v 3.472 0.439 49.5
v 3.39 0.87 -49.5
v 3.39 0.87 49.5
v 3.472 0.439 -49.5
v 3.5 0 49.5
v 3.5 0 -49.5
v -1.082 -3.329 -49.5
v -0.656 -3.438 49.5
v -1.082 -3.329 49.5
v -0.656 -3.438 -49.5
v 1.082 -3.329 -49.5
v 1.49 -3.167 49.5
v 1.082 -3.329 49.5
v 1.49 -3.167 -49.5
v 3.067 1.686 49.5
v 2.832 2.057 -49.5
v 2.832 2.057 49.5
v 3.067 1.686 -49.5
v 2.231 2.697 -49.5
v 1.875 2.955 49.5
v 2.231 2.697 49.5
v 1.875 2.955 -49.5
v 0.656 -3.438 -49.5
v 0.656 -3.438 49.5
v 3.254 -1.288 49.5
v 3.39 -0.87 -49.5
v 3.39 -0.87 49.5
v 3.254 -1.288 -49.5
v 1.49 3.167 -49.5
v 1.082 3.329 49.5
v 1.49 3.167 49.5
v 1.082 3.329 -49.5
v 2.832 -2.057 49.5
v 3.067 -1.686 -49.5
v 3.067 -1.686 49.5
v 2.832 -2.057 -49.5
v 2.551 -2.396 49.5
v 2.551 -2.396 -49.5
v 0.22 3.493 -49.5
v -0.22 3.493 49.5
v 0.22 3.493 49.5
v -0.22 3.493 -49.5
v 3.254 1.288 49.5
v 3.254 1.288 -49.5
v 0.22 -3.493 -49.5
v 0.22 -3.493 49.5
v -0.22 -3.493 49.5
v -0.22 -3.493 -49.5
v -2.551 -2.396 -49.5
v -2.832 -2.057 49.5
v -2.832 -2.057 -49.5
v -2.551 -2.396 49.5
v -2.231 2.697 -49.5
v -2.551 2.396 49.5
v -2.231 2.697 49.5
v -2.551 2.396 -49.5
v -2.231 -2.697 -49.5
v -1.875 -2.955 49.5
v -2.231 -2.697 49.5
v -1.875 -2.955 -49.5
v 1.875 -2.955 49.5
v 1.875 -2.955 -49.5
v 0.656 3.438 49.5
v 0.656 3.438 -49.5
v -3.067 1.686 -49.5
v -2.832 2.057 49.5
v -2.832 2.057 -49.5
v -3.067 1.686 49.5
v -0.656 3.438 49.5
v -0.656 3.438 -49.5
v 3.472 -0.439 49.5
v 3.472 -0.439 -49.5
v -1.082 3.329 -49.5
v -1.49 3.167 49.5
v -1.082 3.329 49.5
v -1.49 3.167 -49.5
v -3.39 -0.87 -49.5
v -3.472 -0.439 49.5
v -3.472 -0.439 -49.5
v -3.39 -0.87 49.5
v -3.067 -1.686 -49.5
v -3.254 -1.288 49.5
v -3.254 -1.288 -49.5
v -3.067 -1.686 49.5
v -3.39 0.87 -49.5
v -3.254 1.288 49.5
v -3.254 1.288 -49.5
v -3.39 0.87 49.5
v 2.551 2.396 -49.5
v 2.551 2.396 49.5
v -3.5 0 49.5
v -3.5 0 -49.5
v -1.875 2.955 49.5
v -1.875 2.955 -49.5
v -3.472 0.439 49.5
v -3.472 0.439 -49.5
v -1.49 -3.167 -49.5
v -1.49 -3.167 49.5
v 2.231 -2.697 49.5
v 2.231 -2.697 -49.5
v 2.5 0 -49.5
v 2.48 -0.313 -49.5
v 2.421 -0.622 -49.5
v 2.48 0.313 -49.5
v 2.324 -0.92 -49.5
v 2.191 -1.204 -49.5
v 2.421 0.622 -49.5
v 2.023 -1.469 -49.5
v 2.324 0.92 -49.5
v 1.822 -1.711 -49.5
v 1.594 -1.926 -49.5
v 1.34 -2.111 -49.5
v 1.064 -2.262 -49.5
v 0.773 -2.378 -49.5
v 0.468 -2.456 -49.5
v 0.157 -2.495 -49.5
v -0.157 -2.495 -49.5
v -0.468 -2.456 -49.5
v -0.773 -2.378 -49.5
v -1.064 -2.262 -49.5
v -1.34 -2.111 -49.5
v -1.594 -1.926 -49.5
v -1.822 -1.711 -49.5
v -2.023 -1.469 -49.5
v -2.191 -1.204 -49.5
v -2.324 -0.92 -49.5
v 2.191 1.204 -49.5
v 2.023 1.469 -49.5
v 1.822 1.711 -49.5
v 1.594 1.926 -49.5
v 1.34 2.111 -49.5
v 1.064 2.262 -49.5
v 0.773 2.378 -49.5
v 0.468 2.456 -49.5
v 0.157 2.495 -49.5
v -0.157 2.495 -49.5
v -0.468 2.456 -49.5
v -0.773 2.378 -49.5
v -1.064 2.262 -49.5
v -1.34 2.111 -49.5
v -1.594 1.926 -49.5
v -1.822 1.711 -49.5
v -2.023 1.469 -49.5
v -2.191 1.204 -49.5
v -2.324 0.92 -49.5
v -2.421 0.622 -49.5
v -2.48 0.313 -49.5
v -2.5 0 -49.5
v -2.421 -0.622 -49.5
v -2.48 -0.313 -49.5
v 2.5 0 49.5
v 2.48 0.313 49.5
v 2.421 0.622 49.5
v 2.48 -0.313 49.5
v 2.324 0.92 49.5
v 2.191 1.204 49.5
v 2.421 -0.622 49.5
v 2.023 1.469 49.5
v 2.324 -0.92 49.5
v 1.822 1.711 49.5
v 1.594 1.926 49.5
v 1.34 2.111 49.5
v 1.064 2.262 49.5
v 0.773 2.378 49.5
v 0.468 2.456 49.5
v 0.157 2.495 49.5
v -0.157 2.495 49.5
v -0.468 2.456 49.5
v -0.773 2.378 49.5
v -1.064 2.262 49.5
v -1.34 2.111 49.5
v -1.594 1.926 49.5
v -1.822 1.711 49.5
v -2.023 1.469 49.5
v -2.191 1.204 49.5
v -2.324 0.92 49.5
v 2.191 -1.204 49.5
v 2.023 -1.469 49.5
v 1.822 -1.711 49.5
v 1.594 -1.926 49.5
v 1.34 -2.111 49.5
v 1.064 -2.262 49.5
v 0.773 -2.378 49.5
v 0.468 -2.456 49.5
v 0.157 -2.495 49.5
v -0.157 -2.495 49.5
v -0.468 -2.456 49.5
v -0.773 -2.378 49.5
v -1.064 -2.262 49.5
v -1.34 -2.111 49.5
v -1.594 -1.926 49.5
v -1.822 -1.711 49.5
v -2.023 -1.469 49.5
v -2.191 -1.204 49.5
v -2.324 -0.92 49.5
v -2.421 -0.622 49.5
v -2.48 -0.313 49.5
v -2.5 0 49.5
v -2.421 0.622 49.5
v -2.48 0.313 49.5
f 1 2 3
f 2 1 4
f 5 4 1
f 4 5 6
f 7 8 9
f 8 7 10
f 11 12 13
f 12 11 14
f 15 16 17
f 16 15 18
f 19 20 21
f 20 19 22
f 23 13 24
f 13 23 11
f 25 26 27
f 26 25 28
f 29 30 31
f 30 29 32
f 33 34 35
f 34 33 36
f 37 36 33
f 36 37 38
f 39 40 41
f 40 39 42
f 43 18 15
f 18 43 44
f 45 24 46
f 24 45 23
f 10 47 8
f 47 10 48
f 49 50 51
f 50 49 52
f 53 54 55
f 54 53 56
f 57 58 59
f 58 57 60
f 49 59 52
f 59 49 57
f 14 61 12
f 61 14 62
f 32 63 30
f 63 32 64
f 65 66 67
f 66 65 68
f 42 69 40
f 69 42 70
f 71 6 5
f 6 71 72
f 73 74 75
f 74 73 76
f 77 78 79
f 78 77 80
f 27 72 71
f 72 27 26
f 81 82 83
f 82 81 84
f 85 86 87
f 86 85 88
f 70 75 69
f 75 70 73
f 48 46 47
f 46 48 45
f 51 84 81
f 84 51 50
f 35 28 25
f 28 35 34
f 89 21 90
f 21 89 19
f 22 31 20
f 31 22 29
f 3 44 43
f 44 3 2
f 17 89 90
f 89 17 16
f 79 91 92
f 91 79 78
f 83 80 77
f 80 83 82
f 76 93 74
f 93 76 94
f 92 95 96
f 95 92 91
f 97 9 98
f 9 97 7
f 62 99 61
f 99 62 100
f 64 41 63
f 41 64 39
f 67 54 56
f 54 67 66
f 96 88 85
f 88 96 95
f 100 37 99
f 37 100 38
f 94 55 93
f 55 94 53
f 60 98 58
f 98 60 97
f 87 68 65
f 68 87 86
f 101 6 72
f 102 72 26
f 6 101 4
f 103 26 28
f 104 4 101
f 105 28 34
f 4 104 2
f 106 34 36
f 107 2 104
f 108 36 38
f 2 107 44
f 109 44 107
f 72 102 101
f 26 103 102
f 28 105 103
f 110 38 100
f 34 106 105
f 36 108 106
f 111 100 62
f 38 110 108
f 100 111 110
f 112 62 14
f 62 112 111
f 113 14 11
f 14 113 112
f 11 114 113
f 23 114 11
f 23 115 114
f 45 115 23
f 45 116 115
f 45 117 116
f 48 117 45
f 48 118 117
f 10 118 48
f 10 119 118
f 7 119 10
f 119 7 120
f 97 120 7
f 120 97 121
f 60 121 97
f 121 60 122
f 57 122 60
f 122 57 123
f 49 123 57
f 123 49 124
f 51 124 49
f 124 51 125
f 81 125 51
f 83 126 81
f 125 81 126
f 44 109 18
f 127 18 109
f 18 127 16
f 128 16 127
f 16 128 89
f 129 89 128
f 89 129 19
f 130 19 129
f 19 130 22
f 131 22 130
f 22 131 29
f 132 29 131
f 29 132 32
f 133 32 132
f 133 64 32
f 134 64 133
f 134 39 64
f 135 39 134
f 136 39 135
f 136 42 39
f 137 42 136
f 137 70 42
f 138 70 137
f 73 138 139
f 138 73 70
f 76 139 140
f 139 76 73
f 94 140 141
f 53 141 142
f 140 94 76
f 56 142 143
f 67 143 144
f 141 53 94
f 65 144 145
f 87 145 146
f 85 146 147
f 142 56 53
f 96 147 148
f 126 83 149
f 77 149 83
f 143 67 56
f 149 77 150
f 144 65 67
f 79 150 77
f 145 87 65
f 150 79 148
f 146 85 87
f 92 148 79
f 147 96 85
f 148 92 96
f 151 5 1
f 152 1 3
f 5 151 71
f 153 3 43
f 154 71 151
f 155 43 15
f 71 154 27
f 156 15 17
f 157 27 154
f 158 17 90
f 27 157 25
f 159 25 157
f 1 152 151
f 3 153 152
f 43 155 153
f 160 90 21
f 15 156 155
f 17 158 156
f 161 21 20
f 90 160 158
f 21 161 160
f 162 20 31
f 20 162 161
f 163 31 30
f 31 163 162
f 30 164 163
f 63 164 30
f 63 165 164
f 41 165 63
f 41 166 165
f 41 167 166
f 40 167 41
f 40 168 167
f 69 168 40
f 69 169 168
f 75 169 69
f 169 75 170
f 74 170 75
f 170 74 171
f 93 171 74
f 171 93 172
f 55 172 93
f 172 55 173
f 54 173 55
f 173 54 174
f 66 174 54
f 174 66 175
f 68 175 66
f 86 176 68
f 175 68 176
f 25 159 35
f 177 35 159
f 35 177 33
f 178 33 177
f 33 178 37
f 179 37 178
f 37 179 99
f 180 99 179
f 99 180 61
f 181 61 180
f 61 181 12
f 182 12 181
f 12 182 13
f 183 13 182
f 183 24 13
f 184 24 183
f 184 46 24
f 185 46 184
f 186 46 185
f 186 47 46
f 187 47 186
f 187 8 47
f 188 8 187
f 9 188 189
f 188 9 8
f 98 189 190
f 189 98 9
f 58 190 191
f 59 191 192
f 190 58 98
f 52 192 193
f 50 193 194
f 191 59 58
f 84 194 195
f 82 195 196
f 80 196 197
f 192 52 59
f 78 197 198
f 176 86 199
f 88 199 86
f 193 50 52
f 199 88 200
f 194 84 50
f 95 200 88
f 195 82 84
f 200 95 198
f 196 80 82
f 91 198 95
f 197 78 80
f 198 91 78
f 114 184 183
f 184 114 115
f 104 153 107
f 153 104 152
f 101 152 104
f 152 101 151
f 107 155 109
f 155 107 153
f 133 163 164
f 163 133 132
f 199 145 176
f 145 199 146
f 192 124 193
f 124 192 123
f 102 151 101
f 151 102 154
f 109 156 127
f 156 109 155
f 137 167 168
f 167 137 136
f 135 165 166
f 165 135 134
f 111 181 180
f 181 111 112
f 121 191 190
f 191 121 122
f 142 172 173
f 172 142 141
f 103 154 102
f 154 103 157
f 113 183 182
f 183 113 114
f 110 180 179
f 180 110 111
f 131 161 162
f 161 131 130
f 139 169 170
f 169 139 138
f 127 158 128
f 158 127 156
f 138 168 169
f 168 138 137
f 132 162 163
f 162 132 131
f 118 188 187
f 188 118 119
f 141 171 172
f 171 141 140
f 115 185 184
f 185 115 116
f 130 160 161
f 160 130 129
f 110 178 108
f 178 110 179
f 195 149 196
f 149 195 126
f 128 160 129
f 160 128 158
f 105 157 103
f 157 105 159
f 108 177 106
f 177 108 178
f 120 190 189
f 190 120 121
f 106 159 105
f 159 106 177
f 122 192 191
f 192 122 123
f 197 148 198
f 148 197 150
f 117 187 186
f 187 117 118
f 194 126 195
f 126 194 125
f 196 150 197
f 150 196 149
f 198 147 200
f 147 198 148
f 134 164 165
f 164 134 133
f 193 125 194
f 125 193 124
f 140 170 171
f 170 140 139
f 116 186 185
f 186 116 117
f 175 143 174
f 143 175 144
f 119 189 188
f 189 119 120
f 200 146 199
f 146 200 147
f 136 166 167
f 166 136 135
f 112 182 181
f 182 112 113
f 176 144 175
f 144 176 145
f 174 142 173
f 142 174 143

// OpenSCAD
$fn = 50;


difference() {
	union() {
		translate(v = [0, 0, -49.5000000000]) {
			cylinder(h = 99, r = 3.5000000000);
		}
	}
	union() {
		translate(v = [0, 0, -100.0000000000]) {
			cylinder(h = 200, r = 2.5000000000);
		}
	}
}
